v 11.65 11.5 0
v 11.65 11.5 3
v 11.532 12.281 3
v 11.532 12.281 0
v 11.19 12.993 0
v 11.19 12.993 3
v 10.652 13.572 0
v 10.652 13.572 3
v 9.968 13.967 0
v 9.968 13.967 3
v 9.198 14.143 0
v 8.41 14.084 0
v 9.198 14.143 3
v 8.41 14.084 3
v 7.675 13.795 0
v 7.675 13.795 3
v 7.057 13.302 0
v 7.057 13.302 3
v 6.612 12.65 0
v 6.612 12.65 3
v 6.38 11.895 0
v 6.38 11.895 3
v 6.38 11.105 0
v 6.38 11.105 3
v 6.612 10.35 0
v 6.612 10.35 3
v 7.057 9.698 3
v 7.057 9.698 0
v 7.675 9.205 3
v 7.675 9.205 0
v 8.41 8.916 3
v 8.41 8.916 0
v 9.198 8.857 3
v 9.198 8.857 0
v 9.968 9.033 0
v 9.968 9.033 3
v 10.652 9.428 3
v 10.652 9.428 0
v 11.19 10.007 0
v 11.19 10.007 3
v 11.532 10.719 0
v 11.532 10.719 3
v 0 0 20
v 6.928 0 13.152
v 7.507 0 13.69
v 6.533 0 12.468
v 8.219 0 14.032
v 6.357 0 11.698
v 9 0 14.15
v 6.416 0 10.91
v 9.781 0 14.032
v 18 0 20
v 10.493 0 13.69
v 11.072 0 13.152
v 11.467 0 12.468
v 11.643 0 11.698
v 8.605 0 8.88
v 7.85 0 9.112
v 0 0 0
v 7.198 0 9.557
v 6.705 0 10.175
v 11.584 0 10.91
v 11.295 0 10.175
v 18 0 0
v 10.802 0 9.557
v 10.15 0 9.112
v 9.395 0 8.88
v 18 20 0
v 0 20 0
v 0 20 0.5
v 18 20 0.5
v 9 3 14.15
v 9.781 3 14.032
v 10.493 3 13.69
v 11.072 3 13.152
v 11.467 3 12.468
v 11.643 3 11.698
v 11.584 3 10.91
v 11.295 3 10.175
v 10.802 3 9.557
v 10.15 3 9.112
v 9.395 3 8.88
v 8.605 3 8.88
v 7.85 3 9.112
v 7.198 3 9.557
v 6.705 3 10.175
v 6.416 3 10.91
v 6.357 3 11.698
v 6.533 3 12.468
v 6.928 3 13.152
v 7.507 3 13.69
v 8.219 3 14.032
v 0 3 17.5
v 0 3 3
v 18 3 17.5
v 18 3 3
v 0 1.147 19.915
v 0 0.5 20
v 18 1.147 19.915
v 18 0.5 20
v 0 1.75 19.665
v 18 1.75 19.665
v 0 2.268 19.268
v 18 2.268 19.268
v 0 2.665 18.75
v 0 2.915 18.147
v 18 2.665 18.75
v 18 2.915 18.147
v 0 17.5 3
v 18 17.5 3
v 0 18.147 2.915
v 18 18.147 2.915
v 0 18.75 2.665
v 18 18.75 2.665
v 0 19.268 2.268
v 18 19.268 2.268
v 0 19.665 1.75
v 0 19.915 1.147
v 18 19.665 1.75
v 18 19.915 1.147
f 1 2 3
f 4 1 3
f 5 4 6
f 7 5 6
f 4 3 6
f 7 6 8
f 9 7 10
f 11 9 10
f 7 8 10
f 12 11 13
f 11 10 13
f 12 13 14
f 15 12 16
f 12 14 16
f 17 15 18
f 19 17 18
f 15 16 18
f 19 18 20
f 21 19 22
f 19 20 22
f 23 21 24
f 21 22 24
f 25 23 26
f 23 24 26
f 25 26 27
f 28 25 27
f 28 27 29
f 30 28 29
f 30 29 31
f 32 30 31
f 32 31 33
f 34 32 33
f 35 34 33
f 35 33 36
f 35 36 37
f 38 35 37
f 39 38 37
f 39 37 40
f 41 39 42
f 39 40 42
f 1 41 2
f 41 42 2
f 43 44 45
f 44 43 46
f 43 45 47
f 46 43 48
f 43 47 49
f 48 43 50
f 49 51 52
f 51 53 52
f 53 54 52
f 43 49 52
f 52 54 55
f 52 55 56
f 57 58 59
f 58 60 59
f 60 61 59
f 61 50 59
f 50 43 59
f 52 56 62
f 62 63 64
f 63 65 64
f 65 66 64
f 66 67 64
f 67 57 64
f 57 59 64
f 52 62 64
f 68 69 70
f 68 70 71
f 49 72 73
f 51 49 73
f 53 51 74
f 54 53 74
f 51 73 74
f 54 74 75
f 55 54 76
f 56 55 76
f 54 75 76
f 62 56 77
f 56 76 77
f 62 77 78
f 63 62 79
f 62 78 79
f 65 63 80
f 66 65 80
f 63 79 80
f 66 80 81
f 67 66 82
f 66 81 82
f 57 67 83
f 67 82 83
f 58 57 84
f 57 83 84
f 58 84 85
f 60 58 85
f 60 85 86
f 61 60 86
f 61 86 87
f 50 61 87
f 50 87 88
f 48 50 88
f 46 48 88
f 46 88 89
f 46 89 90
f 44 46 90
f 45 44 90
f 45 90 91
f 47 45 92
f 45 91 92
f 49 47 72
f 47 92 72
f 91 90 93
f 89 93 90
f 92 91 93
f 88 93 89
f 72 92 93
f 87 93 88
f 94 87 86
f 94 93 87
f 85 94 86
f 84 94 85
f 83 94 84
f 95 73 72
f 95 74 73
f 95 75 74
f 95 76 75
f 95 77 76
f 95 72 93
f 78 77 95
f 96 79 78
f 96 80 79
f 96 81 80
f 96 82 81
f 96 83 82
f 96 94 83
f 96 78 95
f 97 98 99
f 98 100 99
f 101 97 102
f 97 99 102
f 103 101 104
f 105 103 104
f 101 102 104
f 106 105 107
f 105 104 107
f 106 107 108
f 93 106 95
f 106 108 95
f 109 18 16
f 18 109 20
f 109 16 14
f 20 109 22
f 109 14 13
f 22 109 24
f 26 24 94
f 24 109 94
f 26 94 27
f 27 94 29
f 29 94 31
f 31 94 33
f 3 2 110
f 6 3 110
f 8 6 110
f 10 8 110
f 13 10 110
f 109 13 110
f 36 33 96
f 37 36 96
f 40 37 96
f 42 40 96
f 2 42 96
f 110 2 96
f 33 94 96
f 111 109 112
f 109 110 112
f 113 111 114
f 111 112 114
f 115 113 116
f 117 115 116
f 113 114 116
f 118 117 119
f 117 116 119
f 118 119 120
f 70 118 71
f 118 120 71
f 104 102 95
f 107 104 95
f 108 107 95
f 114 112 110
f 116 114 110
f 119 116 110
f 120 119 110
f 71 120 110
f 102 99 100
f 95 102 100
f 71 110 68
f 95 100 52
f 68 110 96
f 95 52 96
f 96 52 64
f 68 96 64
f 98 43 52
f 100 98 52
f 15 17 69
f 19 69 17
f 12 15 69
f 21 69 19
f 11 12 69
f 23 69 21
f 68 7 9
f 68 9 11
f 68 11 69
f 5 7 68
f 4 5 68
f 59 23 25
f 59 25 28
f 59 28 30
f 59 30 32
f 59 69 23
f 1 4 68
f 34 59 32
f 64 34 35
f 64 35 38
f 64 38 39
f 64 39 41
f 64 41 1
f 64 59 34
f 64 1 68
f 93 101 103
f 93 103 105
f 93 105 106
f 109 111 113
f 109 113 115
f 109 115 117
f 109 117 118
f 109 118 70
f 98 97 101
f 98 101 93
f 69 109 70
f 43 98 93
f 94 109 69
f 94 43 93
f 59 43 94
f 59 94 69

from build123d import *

# Parameters (mm, degrees)
SKETCH1_W           = 18
SKETCH1_H           = 20
BOSS_EXTRUDE3_DEPTH = 3
SKETCH4_W           = 18
SKETCH4_H           = 3
BOSS_EXTRUDE4_DEPTH = 17
SKETCH5_R           = 2.65
CUT_EXTRUDE1_DEPTH  = 3
SKETCH6_R           = 2.65
CUT_EXTRUDE2_DEPTH  = 3
FILLET1_R           = 2.5


with BuildPart() as part:
    # Sketch1 → Boss-Extrude3 (new body)
    with BuildSketch(Plane(origin=(0, 0, 0), x_dir=(1, 0, 0), z_dir=(0, 1, 0))):
        with Locations((9, -10)):
            Rectangle(SKETCH1_W, SKETCH1_H)
    extrude(amount=BOSS_EXTRUDE3_DEPTH)

    # Sketch4 → Boss-Extrude4 (add)
    with BuildSketch(Plane(origin=(0, 3, 0), x_dir=(1, 0, 0), z_dir=(0, 1, 0))):
        with Locations((9, -1.5)):
            Rectangle(SKETCH4_W, SKETCH4_H)
    extrude(amount=BOSS_EXTRUDE4_DEPTH)

    # Sketch5 → Cut-Extrude1 (cut)
    with BuildSketch(Plane(origin=(0, 3, 0), x_dir=(1, 0, 0), z_dir=(0, 1, 0))):
        with Locations(Location((9, -11.5, 0), (0, 0, 270))):
            Circle(SKETCH5_R)
    extrude(amount=-CUT_EXTRUDE1_DEPTH, mode=Mode.SUBTRACT)

    # Sketch6 → Cut-Extrude2 (cut)
    with BuildSketch(Plane.XY.offset(3)):
        with Locations((9, 11.5)):
            Circle(SKETCH6_R)
    extrude(amount=-CUT_EXTRUDE2_DEPTH, mode=Mode.SUBTRACT)

    # Fillet1
    fillet1_edges = [part.edges().sort_by_distance(p)[0] for p in [
        (9, 20, 3),
        (9, 3, 20),
    ]]
    fillet(fillet1_edges, radius=FILLET1_R)


solid = part.part
